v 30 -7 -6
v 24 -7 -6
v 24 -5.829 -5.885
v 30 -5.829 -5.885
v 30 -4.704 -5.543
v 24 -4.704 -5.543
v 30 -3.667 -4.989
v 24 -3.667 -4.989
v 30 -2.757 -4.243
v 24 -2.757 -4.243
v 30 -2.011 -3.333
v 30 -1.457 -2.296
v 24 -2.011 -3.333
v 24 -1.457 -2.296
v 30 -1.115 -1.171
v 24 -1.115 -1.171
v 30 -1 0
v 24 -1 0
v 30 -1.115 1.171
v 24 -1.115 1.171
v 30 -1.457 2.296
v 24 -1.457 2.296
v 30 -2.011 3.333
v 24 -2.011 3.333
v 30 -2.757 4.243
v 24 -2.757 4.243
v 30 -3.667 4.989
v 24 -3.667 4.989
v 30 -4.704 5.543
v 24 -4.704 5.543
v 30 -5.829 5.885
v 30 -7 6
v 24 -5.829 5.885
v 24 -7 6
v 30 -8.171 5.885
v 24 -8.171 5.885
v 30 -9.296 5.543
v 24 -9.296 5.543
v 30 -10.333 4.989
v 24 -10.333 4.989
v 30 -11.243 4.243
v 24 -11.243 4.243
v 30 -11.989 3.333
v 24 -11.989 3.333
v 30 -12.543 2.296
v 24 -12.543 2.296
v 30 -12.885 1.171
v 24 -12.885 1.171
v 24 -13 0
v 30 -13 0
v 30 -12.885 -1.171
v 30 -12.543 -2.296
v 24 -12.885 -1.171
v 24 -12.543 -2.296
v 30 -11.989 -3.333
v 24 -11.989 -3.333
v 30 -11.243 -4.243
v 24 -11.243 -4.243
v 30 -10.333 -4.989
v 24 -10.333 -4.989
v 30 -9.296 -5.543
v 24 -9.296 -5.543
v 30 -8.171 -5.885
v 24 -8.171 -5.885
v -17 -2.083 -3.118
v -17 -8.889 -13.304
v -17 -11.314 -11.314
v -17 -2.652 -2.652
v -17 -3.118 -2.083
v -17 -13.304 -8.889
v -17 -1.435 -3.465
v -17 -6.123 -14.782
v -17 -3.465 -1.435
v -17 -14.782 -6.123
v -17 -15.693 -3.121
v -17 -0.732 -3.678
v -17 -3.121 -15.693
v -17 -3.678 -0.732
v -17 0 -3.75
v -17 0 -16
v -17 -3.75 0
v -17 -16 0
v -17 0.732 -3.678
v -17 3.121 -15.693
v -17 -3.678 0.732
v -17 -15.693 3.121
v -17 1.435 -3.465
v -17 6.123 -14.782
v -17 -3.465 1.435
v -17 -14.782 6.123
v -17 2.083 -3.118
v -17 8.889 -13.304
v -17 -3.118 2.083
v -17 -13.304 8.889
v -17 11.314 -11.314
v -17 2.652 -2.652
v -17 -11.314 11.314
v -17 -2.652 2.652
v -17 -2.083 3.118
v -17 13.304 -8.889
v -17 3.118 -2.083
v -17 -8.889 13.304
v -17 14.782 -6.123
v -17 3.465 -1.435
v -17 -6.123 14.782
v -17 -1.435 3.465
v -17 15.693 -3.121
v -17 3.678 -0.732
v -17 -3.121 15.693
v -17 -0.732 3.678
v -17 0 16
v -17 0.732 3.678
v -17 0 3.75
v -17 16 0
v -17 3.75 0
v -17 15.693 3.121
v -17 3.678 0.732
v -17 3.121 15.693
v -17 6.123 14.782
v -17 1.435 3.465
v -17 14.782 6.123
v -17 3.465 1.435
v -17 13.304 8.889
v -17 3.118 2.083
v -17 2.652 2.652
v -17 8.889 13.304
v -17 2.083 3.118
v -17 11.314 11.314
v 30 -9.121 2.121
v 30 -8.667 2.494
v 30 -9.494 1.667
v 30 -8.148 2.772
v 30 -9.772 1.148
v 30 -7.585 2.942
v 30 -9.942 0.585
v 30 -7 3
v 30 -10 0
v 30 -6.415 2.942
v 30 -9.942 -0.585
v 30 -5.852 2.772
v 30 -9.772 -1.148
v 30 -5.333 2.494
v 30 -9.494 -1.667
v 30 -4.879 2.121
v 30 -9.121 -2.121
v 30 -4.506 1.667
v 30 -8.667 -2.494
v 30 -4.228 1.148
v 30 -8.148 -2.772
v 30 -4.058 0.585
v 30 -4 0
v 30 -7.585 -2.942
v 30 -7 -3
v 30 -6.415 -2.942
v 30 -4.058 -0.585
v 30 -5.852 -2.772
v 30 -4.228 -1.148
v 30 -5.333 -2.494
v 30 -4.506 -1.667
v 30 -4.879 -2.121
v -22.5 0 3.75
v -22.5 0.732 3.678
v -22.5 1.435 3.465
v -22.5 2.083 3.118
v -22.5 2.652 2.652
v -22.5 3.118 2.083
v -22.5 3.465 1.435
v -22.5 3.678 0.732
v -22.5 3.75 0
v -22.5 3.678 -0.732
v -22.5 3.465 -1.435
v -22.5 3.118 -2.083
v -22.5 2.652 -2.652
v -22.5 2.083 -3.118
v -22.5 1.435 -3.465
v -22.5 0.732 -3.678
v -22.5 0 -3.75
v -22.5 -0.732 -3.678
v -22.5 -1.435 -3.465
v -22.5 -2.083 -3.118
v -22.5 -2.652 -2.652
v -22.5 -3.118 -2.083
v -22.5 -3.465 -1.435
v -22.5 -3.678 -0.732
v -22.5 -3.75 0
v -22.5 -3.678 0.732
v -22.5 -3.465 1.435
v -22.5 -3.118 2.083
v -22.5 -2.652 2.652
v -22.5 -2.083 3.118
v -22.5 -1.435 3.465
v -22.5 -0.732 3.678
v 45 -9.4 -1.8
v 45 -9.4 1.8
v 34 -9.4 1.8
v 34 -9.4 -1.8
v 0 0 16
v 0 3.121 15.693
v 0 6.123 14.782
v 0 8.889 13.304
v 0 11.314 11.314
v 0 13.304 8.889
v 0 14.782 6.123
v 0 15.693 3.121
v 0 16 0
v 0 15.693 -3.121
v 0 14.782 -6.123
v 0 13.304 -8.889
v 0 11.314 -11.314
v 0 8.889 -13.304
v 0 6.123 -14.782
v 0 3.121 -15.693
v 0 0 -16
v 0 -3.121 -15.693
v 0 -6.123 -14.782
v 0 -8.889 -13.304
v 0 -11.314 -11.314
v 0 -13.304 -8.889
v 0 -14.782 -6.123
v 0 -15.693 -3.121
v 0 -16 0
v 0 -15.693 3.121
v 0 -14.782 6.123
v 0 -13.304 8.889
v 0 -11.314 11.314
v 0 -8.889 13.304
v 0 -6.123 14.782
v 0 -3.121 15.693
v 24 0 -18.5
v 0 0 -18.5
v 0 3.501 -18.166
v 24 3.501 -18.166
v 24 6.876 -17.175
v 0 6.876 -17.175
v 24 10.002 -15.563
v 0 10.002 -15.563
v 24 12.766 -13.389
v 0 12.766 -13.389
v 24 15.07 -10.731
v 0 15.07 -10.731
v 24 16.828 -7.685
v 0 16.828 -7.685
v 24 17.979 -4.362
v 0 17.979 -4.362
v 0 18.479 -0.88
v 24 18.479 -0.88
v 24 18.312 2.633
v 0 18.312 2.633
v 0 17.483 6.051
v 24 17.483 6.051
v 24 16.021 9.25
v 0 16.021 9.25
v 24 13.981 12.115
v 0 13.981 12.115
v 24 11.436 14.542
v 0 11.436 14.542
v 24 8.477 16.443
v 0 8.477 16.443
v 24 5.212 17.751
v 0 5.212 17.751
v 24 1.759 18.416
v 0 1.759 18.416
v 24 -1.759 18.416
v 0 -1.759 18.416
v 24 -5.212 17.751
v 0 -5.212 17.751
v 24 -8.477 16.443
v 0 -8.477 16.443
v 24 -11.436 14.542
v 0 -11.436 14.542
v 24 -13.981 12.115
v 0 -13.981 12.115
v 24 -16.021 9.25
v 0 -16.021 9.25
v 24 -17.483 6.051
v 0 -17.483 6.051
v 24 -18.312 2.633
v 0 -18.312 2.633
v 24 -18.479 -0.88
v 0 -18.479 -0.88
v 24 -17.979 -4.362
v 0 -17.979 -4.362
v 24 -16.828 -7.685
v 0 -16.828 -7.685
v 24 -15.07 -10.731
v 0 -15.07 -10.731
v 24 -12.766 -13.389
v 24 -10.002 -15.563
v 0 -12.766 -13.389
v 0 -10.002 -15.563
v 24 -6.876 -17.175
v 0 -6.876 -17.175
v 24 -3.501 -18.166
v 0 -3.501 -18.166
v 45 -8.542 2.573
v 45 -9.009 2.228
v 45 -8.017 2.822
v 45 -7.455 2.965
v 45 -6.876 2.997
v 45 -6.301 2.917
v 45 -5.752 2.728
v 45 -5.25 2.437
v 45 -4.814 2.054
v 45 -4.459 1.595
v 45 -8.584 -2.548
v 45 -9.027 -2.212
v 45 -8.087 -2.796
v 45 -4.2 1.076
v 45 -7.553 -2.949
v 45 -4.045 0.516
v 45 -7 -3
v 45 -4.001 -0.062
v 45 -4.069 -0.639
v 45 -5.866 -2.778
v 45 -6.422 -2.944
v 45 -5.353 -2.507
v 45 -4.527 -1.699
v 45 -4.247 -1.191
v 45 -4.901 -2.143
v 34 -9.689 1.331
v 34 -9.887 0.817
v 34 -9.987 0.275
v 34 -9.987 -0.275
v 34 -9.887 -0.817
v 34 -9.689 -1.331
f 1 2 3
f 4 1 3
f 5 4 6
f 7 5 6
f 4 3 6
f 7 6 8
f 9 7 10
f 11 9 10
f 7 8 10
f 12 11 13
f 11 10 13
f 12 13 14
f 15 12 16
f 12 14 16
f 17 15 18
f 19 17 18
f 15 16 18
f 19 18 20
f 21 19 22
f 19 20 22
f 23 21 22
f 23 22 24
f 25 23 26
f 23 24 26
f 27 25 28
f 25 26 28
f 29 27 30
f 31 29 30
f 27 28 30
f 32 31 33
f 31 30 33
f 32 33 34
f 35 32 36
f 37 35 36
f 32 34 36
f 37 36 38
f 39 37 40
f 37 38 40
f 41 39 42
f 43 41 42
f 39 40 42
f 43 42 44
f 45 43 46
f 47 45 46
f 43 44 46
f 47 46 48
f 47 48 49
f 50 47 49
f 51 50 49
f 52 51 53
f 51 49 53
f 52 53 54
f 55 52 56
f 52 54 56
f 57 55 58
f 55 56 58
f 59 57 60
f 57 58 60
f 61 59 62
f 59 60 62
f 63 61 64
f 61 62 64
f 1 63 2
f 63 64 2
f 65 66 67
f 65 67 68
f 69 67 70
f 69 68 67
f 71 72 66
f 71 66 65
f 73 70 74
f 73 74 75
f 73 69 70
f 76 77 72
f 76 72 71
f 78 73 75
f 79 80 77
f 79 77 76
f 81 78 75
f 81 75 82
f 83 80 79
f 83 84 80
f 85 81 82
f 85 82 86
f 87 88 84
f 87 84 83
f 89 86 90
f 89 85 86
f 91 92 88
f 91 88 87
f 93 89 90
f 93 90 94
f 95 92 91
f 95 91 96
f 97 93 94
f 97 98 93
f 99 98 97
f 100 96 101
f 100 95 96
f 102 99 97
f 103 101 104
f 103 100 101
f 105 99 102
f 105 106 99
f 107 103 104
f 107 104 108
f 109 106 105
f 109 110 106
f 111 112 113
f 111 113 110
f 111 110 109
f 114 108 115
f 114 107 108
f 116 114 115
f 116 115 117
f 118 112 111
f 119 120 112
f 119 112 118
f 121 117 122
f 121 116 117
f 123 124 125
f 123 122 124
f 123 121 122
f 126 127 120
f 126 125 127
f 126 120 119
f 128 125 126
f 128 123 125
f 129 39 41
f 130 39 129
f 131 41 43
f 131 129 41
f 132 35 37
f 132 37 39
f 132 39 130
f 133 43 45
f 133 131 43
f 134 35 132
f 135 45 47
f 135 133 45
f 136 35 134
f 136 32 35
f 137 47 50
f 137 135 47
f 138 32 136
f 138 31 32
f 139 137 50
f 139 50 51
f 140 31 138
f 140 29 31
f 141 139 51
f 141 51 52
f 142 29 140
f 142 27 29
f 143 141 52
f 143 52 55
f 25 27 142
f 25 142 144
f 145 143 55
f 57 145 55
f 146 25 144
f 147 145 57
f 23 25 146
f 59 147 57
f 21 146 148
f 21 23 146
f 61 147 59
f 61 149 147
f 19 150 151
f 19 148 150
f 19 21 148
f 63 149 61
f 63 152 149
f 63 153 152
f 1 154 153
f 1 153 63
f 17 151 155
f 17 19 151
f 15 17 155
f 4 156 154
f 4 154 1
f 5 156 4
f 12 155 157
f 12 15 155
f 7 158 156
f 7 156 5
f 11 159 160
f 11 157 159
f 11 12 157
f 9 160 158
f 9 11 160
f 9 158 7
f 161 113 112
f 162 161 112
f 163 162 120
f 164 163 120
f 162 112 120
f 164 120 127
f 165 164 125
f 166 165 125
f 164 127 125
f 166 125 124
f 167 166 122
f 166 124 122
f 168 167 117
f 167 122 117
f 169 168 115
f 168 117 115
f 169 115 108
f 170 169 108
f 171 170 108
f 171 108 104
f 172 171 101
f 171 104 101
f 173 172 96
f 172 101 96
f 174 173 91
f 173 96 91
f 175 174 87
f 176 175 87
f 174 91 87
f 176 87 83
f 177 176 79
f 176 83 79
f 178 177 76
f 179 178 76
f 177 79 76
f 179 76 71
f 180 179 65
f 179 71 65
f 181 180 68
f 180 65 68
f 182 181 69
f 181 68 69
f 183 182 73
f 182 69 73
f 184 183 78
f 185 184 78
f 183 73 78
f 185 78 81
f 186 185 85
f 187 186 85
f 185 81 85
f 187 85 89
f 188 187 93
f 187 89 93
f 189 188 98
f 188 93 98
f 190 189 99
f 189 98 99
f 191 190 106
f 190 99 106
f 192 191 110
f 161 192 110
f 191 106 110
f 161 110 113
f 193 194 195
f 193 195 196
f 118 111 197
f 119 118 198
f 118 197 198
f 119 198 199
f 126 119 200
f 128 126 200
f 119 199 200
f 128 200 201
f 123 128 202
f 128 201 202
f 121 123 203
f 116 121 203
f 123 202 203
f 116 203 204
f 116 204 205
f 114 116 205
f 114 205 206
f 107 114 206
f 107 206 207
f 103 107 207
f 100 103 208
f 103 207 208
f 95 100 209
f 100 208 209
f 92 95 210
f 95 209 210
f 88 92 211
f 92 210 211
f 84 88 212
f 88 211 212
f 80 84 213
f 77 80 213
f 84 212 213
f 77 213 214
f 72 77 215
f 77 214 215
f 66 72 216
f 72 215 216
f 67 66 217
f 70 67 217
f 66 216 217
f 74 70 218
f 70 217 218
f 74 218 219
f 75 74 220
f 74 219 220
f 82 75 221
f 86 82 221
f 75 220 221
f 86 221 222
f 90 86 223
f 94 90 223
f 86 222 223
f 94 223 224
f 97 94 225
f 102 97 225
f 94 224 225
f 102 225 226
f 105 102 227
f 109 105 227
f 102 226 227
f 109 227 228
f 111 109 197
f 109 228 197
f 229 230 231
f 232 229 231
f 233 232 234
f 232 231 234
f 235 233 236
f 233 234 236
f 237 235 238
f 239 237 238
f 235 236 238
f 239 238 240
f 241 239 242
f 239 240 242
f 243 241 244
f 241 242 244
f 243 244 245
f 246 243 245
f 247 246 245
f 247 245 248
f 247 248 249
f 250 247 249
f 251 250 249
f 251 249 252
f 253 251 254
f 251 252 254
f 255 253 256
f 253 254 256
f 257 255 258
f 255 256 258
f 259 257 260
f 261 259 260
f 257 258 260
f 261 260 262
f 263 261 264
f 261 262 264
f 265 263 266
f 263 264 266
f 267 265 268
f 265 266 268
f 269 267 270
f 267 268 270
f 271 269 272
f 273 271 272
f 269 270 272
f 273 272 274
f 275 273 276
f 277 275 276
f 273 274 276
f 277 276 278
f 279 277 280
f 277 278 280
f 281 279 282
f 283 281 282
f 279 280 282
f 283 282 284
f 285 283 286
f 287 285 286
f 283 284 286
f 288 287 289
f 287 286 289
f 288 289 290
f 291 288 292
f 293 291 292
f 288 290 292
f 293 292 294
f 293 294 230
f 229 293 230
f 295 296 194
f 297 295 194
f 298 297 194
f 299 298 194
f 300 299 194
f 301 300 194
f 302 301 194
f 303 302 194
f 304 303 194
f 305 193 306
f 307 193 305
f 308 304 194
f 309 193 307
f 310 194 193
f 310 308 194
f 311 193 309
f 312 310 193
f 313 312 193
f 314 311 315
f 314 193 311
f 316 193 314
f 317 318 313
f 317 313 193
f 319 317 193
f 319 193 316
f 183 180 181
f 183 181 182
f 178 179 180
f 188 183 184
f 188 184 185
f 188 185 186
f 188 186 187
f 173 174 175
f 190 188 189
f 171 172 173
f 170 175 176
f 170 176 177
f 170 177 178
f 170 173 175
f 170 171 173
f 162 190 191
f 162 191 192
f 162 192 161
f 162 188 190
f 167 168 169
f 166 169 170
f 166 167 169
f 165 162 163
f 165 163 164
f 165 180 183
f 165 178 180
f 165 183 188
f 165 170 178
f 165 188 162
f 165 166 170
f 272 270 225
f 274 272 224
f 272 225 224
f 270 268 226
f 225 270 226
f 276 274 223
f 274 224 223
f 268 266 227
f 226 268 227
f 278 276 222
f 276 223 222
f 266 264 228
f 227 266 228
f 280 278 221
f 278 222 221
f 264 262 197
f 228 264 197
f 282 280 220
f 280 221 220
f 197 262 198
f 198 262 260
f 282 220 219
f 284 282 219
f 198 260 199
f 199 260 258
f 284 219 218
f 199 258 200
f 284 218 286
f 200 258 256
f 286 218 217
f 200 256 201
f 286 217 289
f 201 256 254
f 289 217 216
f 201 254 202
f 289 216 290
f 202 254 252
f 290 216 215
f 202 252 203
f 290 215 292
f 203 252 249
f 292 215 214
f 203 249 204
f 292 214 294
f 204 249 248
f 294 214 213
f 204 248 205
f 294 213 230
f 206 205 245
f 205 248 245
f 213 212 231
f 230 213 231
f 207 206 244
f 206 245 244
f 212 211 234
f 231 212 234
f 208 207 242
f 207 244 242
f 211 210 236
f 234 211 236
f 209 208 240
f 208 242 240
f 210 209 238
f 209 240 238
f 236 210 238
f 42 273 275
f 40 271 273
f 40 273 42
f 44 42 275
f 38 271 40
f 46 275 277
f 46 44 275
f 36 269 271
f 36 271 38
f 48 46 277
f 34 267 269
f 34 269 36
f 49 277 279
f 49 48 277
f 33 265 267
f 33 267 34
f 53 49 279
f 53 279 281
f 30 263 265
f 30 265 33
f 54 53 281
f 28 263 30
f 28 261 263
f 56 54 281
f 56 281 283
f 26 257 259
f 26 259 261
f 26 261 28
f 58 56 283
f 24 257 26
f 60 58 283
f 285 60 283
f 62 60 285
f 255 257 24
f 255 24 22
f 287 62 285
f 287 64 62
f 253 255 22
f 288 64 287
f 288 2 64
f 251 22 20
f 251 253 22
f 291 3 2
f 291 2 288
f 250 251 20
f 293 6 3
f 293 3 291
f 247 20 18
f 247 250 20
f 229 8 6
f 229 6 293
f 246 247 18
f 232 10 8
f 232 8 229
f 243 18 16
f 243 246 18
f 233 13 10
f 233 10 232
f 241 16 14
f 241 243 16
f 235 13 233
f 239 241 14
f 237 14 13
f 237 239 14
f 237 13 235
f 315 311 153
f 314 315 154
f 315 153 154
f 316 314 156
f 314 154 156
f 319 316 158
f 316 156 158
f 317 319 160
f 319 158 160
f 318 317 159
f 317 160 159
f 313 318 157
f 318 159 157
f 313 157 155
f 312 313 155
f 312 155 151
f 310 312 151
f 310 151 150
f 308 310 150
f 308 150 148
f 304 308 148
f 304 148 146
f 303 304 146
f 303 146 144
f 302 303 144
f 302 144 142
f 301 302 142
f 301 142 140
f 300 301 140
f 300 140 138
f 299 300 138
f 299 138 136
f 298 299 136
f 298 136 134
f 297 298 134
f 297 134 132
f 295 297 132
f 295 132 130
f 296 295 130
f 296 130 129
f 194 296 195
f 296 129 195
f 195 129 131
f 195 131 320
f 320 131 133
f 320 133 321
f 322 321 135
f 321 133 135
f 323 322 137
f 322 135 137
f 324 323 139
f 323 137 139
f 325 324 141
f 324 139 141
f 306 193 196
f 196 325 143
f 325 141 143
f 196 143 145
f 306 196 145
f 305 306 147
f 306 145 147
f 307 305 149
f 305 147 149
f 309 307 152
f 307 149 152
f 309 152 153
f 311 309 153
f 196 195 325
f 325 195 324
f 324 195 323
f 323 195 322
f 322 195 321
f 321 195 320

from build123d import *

# Parameters (mm, degrees)
SKETCH1_R           = 18.5
BOSS_EXTRUDE1_DEPTH = 24
SKETCH2_R           = 16
BOSS_EXTRUDE2_DEPTH = 17
SKETCH4_R           = 6
BOSS_EXTRUDE3_DEPTH = 6
SKETCH5_R           = 3
BOSS_EXTRUDE4_DEPTH = 15
SKETCH6_W           = 6.457083565
SKETCH6_H           = 2.403469994
CUT_EXTRUDE1_DEPTH  = 11
SKETCH7_R           = 3.75
BOSS_EXTRUDE5_DEPTH = 5.5


with BuildPart() as part:
    # Sketch1 → Boss-Extrude1 (new body)
    with BuildSketch(Plane(origin=(0, 0, 0), x_dir=(0, 0, -1), z_dir=(1, 0, 0))):
        Circle(SKETCH1_R)
    extrude(amount=BOSS_EXTRUDE1_DEPTH)

    # Sketch2 → Boss-Extrude2 (add)
    with BuildSketch(Plane.ZY):
        Circle(SKETCH2_R)
    extrude(amount=BOSS_EXTRUDE2_DEPTH)

    # Sketch4 → Boss-Extrude3 (add)
    with BuildSketch(Plane(origin=(24, 0, 0), x_dir=(0, 0, -1), z_dir=(1, 0, 0))):
        with Locations((0, -7)):
            Circle(SKETCH4_R)
    extrude(amount=BOSS_EXTRUDE3_DEPTH)

    # Sketch5 → Boss-Extrude4 (add)
    with BuildSketch(Plane(origin=(30, 0, 0), x_dir=(0, 0, -1), z_dir=(1, 0, 0))):
        with Locations((0, -7)):
            Circle(SKETCH5_R)
    extrude(amount=BOSS_EXTRUDE4_DEPTH)

    # Sketch6 → Cut-Extrude1 (cut)
    with BuildSketch(Plane(origin=(45, 0, 0), x_dir=(0, 0, -1), z_dir=(1, 0, 0))):
        with Locations((-0.362875994, -10.601734997)):
            Rectangle(SKETCH6_W, SKETCH6_H)
    extrude(amount=-CUT_EXTRUDE1_DEPTH, mode=Mode.SUBTRACT)

    # Sketch7 → Boss-Extrude5 (add)
    with BuildSketch(Plane.ZY.offset(17)):
        Circle(SKETCH7_R)
    extrude(amount=BOSS_EXTRUDE5_DEPTH)


solid = part.part
